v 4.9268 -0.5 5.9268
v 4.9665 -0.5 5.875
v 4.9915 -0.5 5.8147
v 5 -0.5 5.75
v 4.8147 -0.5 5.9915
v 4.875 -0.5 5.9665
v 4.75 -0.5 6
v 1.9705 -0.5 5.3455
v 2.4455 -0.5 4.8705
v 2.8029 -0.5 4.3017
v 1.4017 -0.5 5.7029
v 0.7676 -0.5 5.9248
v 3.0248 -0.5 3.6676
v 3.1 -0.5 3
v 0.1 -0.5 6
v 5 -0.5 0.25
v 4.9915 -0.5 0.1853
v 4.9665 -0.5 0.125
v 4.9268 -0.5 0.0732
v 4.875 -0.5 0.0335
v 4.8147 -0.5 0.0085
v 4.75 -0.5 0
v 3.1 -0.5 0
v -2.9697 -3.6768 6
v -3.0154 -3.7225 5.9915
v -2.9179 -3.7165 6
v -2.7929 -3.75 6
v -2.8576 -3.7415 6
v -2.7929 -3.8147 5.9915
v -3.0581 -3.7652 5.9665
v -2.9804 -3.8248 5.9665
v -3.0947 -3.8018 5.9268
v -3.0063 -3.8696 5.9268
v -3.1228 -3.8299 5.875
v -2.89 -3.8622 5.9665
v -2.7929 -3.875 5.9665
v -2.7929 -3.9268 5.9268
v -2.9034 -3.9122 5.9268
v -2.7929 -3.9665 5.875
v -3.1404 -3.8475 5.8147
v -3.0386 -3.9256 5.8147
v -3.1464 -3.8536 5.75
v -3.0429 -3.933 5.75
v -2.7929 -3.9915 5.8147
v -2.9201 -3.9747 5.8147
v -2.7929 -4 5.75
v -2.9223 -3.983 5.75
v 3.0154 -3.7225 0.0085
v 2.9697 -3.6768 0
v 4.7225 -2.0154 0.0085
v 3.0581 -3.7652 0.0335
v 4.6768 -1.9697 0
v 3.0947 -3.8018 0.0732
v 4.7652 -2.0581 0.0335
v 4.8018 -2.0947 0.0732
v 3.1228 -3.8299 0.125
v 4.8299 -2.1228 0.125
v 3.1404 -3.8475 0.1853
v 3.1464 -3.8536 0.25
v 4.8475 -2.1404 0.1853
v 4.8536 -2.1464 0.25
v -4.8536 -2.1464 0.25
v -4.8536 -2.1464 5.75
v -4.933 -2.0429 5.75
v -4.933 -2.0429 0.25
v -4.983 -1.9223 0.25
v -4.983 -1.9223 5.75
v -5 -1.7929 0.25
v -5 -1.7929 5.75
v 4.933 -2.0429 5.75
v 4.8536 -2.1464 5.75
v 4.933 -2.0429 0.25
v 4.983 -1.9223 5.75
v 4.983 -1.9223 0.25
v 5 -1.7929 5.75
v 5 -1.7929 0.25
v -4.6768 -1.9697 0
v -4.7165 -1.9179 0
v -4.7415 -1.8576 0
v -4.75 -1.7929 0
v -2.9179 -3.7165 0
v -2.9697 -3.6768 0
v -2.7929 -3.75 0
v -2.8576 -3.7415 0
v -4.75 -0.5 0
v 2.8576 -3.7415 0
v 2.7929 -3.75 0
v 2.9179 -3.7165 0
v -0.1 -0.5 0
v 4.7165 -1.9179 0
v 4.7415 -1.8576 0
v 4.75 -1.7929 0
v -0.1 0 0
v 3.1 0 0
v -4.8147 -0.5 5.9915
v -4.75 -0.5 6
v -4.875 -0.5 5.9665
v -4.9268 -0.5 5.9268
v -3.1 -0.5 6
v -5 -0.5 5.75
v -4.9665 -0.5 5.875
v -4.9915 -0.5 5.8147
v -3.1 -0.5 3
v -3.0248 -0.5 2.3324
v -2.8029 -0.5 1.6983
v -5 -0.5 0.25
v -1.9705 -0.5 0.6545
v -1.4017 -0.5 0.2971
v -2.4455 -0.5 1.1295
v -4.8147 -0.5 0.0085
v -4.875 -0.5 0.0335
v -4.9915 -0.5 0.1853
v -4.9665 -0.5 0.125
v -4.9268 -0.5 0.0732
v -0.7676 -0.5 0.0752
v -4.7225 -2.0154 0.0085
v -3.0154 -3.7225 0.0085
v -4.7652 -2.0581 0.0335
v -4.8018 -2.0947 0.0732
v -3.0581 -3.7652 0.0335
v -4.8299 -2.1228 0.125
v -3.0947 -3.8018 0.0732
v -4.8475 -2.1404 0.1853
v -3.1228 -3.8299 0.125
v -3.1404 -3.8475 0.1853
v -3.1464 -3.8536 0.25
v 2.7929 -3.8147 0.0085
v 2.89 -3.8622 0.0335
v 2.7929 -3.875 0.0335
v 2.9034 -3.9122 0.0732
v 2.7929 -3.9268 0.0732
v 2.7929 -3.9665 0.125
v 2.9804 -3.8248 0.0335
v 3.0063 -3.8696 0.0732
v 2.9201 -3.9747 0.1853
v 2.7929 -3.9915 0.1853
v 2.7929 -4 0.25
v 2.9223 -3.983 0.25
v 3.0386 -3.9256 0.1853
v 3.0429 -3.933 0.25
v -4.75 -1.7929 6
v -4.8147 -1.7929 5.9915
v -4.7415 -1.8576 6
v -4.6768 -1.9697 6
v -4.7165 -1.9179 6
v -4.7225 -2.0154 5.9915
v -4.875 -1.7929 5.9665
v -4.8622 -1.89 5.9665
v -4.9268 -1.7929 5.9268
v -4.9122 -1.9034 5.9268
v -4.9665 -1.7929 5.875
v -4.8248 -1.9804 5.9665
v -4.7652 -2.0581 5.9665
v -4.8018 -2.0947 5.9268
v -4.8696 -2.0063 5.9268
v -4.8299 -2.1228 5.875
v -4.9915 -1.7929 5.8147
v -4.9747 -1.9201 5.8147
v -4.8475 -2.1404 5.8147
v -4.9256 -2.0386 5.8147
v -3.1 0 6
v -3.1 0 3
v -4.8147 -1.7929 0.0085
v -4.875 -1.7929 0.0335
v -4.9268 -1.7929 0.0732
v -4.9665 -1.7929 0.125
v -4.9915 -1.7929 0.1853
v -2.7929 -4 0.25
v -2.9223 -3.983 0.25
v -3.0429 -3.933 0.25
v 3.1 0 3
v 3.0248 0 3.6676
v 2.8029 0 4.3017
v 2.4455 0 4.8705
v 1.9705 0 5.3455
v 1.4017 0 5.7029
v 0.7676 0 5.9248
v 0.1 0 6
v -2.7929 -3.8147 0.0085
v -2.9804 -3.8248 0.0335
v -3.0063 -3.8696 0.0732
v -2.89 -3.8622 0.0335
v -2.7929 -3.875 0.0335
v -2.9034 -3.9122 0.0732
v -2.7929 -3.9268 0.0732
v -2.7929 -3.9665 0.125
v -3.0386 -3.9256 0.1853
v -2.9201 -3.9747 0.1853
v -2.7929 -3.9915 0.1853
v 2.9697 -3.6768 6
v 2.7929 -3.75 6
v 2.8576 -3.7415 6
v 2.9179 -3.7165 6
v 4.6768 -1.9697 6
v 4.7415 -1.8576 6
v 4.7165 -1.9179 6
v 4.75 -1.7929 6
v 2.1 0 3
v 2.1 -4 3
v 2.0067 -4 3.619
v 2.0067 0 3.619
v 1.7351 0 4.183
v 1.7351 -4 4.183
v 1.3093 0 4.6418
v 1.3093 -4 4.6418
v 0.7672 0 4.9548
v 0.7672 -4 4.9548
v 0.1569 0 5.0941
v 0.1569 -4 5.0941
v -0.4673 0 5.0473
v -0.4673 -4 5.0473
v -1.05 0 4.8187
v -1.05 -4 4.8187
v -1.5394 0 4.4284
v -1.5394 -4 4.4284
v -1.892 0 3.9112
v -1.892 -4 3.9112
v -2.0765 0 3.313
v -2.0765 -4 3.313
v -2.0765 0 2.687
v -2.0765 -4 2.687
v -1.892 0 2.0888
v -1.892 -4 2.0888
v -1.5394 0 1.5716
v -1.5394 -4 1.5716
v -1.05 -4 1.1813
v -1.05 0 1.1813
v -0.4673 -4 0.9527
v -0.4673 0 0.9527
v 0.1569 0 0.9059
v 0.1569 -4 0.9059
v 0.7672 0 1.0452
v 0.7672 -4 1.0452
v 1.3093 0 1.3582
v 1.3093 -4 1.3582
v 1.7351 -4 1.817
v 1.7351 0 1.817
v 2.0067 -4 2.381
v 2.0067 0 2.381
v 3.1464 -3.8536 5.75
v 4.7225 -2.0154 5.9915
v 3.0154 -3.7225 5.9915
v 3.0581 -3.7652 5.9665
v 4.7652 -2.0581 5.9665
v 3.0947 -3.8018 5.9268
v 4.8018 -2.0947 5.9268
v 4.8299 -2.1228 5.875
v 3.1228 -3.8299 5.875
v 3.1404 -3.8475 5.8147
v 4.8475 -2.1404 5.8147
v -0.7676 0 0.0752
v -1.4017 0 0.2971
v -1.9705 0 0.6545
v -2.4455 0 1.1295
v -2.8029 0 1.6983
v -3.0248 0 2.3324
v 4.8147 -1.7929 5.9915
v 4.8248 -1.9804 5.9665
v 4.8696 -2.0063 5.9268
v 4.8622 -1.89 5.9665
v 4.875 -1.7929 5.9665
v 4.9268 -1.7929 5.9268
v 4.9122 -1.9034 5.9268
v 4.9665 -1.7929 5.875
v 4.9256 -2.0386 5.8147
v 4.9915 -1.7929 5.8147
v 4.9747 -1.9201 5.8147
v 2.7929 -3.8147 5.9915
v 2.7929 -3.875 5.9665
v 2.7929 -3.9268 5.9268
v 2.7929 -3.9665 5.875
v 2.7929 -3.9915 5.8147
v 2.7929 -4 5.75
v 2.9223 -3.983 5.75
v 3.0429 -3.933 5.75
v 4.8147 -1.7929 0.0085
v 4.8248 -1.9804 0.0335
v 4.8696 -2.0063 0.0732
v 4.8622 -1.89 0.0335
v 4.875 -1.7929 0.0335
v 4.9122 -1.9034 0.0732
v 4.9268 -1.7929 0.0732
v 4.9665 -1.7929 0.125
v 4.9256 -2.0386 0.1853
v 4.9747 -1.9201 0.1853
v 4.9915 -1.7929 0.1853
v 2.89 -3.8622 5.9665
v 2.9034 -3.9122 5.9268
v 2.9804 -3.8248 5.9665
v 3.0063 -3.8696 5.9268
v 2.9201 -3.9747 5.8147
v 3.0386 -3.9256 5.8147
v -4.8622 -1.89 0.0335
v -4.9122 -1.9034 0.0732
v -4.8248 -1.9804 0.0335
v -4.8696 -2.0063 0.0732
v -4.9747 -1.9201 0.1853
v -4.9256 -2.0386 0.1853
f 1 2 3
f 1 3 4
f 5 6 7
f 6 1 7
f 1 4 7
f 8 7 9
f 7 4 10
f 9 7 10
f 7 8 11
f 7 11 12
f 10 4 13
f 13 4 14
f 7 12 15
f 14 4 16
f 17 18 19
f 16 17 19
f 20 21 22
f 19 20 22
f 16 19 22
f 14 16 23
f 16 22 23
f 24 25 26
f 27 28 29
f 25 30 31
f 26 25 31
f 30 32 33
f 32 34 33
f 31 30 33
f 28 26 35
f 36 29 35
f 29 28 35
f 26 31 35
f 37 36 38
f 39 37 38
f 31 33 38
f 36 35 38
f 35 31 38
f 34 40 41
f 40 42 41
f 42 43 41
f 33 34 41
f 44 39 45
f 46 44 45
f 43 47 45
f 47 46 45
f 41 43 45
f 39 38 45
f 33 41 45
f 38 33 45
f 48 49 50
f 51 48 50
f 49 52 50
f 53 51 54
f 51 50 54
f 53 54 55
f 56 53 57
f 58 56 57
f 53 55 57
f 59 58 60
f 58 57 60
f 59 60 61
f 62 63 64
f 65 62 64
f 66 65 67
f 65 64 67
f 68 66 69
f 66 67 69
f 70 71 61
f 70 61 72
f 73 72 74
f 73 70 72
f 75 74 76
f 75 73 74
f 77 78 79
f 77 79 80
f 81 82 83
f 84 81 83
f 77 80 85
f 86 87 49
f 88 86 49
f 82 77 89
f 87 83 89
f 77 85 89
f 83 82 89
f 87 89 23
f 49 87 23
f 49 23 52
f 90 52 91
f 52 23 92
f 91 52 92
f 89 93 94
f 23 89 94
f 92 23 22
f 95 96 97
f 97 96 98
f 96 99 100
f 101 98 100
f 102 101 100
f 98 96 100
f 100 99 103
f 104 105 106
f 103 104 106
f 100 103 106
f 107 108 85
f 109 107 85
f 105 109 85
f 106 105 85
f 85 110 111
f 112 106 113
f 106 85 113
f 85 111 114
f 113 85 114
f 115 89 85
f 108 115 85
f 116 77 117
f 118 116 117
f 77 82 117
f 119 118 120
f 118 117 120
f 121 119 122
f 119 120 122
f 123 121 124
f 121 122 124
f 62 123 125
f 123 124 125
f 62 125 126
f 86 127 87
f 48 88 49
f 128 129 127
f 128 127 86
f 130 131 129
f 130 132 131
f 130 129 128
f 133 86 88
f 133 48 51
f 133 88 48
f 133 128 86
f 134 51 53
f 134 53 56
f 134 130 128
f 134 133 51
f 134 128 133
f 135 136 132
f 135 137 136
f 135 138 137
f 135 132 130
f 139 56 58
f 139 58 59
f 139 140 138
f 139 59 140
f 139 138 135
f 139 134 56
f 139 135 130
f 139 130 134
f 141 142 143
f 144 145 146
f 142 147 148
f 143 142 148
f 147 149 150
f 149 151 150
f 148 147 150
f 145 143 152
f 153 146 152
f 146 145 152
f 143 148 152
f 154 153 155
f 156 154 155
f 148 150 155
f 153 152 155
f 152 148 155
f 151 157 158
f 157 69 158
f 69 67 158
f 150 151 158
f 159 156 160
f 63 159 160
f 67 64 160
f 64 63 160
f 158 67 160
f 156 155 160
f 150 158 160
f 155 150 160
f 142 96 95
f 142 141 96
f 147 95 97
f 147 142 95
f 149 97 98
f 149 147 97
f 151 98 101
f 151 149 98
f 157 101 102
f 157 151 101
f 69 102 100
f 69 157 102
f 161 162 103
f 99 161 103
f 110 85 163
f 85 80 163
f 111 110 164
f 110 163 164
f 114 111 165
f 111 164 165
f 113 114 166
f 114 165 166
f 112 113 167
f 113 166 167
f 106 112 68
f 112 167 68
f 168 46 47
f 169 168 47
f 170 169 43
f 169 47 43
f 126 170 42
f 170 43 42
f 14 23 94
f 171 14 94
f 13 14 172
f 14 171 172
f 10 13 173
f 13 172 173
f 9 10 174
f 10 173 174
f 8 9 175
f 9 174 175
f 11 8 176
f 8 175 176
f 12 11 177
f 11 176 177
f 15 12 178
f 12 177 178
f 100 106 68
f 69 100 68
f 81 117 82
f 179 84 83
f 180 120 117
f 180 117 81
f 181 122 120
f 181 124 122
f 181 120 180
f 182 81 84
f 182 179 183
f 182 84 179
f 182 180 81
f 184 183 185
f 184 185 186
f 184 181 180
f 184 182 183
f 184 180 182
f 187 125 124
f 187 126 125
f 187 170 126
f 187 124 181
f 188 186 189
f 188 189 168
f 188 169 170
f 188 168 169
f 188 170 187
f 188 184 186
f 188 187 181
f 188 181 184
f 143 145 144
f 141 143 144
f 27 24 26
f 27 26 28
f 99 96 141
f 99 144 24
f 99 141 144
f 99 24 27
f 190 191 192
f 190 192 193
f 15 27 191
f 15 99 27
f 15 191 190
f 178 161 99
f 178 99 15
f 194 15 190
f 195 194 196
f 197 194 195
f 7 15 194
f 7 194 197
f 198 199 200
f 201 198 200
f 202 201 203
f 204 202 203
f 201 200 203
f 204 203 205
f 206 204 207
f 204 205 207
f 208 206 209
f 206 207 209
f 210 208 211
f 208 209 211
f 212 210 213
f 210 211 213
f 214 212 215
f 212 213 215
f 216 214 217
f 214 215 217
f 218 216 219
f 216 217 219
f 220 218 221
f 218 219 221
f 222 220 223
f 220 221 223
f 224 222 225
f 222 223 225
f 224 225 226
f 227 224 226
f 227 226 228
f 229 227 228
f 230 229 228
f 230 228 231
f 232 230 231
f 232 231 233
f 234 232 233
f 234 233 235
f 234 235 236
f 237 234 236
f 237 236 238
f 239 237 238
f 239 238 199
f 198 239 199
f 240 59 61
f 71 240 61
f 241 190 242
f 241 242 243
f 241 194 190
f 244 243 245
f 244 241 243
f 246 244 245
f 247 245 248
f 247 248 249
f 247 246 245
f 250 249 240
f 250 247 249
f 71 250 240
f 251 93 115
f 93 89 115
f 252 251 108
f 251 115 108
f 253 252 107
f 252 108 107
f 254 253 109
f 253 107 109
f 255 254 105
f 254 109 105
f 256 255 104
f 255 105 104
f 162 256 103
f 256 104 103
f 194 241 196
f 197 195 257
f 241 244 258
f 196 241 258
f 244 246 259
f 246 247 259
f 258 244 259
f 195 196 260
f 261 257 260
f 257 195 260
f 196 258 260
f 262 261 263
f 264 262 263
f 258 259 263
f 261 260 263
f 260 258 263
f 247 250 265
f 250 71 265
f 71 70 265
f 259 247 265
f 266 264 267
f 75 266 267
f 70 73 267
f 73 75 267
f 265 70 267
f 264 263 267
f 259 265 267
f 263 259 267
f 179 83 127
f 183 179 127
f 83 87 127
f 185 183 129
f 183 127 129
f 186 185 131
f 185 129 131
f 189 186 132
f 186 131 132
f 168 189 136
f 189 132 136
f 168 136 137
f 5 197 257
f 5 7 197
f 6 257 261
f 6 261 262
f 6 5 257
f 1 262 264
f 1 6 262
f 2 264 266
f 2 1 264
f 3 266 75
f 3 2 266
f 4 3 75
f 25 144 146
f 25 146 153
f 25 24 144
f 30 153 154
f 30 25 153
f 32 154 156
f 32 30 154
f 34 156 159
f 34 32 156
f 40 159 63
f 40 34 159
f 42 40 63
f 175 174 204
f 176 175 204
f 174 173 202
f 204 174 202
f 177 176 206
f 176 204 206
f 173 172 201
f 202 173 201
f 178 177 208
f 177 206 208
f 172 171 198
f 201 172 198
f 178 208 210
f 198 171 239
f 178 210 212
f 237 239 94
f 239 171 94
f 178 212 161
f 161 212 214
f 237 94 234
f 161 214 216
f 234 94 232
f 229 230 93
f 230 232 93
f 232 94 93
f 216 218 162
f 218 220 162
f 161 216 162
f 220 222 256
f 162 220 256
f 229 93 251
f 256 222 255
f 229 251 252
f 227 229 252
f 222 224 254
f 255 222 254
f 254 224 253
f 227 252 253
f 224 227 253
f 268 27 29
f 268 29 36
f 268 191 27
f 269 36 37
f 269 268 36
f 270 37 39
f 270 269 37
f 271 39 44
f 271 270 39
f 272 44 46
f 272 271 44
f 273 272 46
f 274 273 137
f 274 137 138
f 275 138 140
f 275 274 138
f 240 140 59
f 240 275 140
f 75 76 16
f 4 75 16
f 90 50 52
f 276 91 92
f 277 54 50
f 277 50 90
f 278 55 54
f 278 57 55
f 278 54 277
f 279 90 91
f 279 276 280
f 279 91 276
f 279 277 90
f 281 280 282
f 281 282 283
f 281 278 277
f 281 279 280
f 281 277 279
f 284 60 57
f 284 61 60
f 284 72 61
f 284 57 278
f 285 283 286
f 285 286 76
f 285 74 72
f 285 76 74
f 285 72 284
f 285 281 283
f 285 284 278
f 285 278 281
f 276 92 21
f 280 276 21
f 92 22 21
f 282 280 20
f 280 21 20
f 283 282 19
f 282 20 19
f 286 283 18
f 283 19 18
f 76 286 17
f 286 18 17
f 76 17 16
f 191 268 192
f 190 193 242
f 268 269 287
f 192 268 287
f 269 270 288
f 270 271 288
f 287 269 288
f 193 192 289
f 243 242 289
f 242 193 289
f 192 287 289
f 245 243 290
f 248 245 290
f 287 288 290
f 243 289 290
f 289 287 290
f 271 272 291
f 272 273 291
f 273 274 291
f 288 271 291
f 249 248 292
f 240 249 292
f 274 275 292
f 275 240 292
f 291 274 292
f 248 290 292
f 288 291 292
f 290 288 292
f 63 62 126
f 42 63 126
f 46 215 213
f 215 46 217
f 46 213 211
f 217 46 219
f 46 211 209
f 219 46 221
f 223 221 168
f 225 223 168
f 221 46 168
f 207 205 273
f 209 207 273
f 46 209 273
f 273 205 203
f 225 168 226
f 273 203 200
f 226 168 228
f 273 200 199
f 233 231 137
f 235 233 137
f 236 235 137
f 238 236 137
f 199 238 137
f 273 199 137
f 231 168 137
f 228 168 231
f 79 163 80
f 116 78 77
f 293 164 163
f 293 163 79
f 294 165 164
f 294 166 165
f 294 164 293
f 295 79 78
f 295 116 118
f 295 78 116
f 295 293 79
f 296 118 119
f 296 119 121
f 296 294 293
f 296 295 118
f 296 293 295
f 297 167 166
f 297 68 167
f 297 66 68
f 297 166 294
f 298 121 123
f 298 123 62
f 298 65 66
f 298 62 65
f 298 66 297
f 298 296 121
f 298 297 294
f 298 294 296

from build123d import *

# Parameters (mm, degrees)
BOSS_EXTRUDE1_DEPTH = 6
M5_TAPPED_HOLE1_D   = 4.2
FILLET1_R           = 3
FILLET2_R           = 0.5
FILLET3_R           = 0.25


with BuildPart() as part:
    # Sketch1 → Boss-Extrude1 (new body)
    with BuildSketch(Plane.XY):
        Polygon((3.1, 0), (-3.1, 0), (-3.1, -0.5), (-5, -0.5), (-5, -2), (-3, -4), (3, -4), (5, -2), (5, -0.5), (3.1, -0.5), align=None)
    extrude(amount=BOSS_EXTRUDE1_DEPTH)

    # M5 Tapped Hole1 (through all)
    with Locations(Plane(origin=(0, 0, 0), x_dir=(-1, 0, 0), z_dir=(0, 1, 0))):
        with Locations((0, 3)):
            Hole(M5_TAPPED_HOLE1_D / 2)

    # Fillet1
    fillet1_edges = [part.edges().sort_by_distance(p)[0] for p in [
        (-3.1, -0.25, 0),
        (3.1, -0.25, 6),
    ]]
    fillet(fillet1_edges, radius=FILLET1_R)

    # Fillet2
    fillet2_edges = [part.edges().sort_by_distance(p)[0] for p in [
        (5, -2, 3),
        (3, -4, 3),
        (-3, -4, 3),
        (-5, -2, 3),
    ]]
    fillet(fillet2_edges, radius=FILLET2_R)

    # Fillet3
    fillet3_edges = [part.edges().sort_by_distance(p)[0] for p in [
        (-5, -1.146446609, 6),
        (-5, -1.146446609, 0),
        (5, -1.146446609, 0),
        (5, -1.146446609, 6),
        (4, -3, 0),
        (0, -4, 0),
        (-4, -3, 0),
        (-2.984234935, -3.961939766, 0),
        (-4.961939766, -1.984234935, 0),
        (2.984234935, -3.961939766, 0),
        (4.961939766, -1.984234935, 0),
        (4, -3, 6),
        (-4, -3, 6),
        (0, -4, 6),
        (-2.984234935, -3.961939766, 6),
        (-4.961939766, -1.984234935, 6),
        (2.984234935, -3.961939766, 6),
        (4.961939766, -1.984234935, 6),
    ]]
    fillet(fillet3_edges, radius=FILLET3_R)


solid = part.part
